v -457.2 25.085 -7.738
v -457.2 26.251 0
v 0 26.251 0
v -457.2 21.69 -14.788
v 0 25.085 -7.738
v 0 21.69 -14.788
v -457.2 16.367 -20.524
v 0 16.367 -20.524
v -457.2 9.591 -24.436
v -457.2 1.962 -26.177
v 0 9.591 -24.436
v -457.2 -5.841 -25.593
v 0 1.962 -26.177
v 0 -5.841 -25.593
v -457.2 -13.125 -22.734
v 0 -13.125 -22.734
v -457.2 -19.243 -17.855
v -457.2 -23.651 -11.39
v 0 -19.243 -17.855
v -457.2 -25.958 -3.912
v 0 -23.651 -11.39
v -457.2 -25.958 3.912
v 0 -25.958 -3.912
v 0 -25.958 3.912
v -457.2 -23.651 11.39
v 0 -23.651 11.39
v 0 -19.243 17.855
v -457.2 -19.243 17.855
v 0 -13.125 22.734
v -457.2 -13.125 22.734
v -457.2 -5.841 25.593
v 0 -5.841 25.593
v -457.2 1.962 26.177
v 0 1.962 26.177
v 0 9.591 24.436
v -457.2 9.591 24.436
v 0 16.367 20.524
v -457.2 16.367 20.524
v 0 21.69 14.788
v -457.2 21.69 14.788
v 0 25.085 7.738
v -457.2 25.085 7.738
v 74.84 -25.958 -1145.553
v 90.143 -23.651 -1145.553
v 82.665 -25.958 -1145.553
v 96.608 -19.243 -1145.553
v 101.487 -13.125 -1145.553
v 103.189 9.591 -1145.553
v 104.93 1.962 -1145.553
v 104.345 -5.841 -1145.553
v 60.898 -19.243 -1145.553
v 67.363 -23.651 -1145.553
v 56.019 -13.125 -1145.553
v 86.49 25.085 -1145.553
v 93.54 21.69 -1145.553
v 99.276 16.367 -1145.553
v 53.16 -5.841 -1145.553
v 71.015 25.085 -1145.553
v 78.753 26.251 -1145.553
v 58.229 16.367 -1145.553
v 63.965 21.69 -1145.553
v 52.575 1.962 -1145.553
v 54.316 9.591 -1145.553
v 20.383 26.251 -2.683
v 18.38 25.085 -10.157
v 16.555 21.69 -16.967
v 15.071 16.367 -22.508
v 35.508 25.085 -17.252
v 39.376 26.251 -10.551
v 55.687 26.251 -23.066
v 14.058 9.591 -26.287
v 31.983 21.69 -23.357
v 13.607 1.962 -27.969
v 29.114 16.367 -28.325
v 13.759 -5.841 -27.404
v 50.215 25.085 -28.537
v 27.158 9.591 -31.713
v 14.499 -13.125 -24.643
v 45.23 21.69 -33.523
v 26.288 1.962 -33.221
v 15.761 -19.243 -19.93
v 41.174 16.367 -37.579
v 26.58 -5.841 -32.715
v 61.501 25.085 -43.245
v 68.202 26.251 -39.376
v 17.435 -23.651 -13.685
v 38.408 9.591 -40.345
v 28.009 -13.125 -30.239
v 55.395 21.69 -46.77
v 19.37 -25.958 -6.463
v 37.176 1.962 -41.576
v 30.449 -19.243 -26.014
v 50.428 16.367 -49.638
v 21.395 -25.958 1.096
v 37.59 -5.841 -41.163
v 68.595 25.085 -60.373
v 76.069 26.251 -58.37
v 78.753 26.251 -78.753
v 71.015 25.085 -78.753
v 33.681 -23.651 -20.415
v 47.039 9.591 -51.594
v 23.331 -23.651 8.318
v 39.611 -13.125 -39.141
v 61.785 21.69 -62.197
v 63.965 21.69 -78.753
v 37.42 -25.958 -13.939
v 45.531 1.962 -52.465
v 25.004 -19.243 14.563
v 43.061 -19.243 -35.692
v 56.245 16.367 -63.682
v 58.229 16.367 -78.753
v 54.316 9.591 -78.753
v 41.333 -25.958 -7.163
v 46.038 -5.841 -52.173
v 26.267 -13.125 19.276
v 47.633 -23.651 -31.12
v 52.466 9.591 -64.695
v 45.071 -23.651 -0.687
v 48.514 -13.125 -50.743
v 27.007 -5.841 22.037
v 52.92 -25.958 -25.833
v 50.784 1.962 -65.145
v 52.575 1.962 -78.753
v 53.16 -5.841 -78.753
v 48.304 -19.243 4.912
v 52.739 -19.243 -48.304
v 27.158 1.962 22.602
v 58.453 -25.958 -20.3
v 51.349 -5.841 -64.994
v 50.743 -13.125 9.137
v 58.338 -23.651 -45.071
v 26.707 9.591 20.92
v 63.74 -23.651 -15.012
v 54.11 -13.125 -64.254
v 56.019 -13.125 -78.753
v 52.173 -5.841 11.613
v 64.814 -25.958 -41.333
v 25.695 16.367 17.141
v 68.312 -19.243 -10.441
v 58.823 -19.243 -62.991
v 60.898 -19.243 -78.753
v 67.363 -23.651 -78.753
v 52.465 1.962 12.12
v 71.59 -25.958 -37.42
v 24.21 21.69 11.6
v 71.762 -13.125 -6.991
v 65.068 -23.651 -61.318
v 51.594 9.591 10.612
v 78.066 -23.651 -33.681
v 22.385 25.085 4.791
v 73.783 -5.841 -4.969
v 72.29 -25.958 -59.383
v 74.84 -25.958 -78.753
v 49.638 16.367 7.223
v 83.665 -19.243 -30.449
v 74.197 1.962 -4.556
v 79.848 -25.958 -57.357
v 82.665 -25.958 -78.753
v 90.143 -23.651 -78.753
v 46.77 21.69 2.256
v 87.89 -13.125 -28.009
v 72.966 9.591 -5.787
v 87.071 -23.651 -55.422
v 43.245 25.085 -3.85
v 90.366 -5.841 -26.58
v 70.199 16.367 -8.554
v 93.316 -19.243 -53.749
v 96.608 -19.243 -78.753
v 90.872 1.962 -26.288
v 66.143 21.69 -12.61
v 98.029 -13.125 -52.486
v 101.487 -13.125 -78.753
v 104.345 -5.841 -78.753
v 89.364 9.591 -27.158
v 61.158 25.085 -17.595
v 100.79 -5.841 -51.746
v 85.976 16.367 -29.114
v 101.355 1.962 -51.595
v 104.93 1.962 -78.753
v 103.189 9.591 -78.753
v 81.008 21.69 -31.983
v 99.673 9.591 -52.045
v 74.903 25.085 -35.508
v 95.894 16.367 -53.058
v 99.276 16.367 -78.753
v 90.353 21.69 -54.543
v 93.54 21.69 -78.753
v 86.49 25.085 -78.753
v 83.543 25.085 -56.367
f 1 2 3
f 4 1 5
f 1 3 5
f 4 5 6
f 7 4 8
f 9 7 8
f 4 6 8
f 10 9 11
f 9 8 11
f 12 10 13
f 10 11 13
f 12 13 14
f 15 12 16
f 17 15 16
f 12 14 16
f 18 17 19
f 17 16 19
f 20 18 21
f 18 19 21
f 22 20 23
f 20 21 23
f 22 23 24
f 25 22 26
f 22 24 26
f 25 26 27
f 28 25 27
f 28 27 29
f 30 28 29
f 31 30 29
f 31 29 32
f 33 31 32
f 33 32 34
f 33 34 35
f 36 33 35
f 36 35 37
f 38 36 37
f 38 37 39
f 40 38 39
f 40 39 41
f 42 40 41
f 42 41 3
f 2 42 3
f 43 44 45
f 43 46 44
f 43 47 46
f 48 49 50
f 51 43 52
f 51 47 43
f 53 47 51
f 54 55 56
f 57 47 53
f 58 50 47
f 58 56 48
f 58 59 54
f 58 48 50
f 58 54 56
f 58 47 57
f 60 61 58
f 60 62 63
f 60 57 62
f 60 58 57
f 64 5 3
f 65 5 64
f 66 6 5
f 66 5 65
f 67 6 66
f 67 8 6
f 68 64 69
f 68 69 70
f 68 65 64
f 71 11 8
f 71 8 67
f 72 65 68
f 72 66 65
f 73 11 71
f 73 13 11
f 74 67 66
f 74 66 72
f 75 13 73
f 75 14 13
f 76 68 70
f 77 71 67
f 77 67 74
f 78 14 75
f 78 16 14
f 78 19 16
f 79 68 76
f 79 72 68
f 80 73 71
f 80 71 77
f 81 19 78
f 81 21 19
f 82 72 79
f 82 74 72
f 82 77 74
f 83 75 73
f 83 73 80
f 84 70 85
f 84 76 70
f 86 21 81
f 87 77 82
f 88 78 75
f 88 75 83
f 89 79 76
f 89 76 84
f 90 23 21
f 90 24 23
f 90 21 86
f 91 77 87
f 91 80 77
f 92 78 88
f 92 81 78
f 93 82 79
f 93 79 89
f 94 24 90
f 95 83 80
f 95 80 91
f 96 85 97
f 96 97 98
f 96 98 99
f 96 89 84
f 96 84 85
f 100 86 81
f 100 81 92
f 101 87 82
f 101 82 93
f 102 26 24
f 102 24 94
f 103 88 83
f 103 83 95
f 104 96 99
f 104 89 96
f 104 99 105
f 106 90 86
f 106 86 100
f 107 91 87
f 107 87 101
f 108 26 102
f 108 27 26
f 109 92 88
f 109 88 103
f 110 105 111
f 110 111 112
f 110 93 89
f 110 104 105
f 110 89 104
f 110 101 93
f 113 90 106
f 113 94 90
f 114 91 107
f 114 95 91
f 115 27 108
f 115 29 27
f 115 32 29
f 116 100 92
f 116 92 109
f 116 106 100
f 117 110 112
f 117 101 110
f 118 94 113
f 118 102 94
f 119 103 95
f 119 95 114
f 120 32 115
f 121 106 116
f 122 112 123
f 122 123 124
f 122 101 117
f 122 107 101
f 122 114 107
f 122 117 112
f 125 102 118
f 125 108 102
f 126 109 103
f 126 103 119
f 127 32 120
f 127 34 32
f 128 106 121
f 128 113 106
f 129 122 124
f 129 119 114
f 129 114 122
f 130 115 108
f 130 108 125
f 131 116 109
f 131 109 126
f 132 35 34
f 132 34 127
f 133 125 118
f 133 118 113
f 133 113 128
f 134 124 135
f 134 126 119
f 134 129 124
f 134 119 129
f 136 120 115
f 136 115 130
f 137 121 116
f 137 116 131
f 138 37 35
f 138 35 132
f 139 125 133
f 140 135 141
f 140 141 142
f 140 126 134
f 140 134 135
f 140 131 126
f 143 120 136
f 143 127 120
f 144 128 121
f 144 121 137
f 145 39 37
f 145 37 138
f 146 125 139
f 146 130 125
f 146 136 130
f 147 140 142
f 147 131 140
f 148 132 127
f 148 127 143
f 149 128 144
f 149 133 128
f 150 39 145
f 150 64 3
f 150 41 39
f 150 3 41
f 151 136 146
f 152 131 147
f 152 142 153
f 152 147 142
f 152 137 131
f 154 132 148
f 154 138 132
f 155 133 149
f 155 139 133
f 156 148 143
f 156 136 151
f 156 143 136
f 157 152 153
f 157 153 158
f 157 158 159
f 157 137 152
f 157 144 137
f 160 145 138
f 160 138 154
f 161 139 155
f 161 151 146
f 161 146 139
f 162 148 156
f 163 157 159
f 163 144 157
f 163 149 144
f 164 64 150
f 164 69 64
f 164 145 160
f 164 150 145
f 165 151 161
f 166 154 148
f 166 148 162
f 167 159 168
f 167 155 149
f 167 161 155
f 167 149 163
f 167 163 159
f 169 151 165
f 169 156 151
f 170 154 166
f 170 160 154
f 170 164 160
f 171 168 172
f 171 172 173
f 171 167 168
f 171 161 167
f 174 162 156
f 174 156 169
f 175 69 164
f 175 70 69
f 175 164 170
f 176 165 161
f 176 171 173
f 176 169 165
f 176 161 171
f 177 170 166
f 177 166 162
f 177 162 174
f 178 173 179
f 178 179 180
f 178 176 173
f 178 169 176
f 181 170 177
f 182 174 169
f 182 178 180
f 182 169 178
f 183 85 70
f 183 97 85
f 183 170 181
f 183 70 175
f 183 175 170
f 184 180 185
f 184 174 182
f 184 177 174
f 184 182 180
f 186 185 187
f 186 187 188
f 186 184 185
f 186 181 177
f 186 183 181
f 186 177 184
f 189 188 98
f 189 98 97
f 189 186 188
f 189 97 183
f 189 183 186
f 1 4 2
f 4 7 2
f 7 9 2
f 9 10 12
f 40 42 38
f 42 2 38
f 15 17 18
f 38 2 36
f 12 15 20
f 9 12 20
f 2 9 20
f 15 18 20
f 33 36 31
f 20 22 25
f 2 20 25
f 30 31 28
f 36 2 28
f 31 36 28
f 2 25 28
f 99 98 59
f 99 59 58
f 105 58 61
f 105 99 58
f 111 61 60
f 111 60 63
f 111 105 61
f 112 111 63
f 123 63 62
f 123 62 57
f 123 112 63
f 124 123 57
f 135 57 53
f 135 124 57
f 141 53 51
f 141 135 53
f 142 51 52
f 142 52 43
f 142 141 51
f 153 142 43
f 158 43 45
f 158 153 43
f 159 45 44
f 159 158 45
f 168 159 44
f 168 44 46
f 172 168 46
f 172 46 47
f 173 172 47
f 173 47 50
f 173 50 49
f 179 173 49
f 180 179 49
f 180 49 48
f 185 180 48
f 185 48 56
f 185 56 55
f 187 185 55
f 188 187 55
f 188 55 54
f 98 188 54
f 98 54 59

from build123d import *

# Parameters (mm, degrees)
F0_R     = 26.2509
F3_DEPTH = 1066.8
F4_DEPTH = 457.2


with BuildPart() as f2:
    # F2: sweep along a path in F1
    with BuildLine(Plane.XZ) as f2_path:
        ThreePointArc((0, 0), (55.6865682067, -23.0661317933), (78.7527, -78.7527))
    # F0 (on Right) → F2 (sweep)
    with BuildSketch(Plane.YZ):
        Circle(F0_R)
    sweep(path=f2_path.line)

    # F3 (add): a face of the model
    f3_faces = [f2.faces().sort_by_distance(p)[0] for p in [
        (78.7527, 0, -78.7527),
    ]]
    extrude(f3_faces, amount=F3_DEPTH)

    # F4 (add): a face of the model
    f4_faces = [f2.faces().sort_by_distance(p)[0] for p in [
        (0, 0, 0),
    ]]
    extrude(f4_faces, amount=F4_DEPTH)


solid = f2.part
